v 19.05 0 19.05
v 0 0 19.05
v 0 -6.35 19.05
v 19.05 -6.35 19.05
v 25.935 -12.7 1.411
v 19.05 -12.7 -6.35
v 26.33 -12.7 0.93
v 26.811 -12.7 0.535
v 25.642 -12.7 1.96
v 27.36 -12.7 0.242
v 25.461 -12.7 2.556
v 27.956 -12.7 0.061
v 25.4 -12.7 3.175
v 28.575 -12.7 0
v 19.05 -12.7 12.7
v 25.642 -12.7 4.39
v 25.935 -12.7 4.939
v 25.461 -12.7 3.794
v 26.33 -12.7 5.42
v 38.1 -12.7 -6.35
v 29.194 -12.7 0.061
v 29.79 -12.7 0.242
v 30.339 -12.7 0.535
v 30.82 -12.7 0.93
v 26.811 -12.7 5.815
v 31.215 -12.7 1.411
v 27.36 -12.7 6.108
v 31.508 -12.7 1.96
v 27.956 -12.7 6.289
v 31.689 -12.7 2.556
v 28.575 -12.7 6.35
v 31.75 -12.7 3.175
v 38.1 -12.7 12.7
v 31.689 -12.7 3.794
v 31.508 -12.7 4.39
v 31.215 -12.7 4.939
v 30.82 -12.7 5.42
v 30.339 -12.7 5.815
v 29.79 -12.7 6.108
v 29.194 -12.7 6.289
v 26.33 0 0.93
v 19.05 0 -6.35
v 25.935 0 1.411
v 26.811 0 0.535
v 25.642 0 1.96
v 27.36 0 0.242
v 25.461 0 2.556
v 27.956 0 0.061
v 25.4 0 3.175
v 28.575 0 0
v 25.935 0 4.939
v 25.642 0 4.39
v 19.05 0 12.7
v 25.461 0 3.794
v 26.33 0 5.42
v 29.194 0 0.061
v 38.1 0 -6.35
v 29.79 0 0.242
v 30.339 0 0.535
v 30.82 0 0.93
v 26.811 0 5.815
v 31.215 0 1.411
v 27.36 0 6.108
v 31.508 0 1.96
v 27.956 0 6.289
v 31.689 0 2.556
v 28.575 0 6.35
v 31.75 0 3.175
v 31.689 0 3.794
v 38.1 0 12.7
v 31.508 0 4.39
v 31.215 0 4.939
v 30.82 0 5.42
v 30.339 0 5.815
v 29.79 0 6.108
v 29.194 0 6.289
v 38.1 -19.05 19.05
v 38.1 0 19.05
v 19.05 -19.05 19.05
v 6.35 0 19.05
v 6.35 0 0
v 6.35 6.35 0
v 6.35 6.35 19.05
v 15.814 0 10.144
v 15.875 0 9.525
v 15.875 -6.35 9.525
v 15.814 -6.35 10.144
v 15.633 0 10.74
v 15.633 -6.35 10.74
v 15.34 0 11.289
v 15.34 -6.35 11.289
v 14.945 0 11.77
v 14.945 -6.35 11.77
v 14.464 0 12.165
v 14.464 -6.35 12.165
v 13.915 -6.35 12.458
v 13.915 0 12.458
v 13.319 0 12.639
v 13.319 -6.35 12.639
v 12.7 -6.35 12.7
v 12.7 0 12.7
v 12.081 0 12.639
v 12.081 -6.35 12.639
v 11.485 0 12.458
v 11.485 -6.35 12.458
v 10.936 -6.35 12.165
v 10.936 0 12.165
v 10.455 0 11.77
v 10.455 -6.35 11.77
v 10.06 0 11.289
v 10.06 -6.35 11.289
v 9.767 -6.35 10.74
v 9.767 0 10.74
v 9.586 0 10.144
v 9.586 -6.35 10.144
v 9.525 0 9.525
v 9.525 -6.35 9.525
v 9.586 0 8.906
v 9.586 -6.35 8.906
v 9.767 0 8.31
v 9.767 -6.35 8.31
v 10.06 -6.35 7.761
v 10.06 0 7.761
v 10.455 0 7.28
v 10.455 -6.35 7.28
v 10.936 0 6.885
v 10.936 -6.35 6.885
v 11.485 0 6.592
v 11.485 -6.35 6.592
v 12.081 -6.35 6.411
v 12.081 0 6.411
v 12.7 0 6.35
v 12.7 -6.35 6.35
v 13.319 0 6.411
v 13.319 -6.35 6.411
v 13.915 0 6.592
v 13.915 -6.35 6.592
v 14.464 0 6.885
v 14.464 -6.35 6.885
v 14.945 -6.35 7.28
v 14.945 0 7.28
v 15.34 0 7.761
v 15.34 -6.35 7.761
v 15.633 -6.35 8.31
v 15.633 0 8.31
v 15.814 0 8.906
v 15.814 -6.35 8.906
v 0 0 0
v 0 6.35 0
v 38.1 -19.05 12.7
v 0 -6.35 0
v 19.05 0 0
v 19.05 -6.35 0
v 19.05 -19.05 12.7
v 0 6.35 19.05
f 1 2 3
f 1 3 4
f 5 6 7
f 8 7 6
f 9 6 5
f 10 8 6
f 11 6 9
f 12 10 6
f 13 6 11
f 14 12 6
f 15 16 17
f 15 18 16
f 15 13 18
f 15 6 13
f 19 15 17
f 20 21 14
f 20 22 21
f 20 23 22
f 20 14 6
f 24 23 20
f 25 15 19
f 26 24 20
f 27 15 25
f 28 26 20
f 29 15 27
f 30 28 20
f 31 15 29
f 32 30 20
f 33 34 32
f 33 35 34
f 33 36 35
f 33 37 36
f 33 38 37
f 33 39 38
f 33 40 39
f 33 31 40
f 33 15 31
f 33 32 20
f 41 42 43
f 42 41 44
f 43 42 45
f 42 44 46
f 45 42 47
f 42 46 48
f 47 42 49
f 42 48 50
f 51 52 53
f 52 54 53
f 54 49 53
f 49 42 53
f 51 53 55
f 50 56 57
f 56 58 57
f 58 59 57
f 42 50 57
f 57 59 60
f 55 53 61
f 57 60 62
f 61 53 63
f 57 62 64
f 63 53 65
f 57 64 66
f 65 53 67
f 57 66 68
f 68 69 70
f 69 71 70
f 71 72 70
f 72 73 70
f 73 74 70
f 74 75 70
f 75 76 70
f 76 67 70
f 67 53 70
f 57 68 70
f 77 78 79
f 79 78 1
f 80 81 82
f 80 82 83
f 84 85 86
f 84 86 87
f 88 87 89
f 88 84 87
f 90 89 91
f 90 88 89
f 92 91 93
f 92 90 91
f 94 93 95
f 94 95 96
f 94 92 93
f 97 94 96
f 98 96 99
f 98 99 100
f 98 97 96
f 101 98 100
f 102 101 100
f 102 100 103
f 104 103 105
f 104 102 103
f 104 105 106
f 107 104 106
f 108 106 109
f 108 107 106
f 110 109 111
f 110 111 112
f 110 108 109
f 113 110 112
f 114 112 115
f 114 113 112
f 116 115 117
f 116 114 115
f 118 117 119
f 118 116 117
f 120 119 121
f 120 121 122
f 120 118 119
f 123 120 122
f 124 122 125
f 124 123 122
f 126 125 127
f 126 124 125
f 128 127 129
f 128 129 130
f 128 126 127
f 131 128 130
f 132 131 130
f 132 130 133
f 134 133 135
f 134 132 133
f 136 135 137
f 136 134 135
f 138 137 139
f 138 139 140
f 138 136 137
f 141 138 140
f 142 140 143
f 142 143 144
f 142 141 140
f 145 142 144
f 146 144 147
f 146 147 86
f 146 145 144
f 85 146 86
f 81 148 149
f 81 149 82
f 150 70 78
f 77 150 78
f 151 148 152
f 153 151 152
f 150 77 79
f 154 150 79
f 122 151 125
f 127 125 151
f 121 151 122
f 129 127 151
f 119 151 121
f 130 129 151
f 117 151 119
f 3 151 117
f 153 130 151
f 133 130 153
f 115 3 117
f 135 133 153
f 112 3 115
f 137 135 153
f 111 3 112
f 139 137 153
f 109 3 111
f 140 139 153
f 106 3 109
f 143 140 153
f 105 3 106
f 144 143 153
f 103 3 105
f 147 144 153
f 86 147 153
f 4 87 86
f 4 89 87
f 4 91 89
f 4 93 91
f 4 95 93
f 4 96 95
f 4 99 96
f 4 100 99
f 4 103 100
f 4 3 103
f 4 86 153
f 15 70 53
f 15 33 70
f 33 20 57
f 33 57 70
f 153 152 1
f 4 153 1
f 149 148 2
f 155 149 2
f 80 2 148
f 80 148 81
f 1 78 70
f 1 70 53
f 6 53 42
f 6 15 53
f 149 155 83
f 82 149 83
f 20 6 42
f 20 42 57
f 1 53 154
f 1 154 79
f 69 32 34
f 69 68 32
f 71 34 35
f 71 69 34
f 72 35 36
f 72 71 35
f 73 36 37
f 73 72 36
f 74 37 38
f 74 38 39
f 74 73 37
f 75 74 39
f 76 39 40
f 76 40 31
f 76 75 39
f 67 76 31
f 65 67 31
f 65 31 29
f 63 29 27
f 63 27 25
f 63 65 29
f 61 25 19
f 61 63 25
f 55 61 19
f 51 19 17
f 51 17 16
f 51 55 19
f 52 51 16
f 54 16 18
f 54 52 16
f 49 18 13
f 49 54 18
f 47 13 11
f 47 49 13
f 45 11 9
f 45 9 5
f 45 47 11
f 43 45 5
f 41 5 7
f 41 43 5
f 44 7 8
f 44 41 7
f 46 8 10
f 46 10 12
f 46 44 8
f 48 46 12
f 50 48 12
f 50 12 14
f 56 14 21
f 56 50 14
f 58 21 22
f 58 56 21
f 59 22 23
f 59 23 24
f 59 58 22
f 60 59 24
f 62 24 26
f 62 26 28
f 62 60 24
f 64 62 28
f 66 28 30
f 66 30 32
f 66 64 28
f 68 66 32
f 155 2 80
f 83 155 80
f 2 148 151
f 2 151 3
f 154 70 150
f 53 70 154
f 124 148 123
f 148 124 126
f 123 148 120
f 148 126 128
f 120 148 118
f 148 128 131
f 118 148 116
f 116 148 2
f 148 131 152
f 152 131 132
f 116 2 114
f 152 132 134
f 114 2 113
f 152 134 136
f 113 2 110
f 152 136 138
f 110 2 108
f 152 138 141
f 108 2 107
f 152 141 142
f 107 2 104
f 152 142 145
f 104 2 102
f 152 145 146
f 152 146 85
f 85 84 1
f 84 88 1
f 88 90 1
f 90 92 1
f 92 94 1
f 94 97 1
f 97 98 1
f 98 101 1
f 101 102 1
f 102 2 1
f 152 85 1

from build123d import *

# Parameters (mm, degrees)
F0_W     = 19.05
F0_H     = 19.05
F0_R     = 3.175
F1_DEPTH = 6.35
F2_W     = 6.35
F2_H     = 19.05
F3_DEPTH = 6.35
F4_R     = 3.175
F5_DEPTH = 6.35
F6_W     = 19.05
F6_H     = 6.35
F7_DEPTH = 19.05


with BuildPart() as f1:
    # F0 (on Front) → F1 (new body)
    with BuildSketch(Plane.XZ):
        with Locations((9.525, 9.525)):
            Rectangle(F0_W, F0_H)
        with Locations((12.7, 9.525)):
            Circle(F0_R, mode=Mode.SUBTRACT)
    extrude(amount=F1_DEPTH)


with BuildPart() as f3:
    # F2 (on face) → F3 (new body)
    with BuildSketch(Plane.XZ):
        with Locations((3.175, 9.525)):
            Rectangle(F2_W, F2_H)
    extrude(amount=-F3_DEPTH)


with BuildPart() as f5:
    # F4 (on face) → F5 (new body, symmetric)
    with BuildSketch(Plane.XZ.offset(6.35)):
        Polygon((19.05, 12.7), (19.05, 0), (19.05, -6.35), (38.1, -6.35), (38.1, 12.7), align=None)
        with Locations((28.575, 3.175)):
            Circle(F4_R, mode=Mode.SUBTRACT)
    extrude(amount=F5_DEPTH, both=True)


with BuildPart() as f7:
    # F6 (on face) → F7 (new body)
    with BuildSketch(Plane(origin=(0, 0, 0), x_dir=(-1, 0, 0), z_dir=(0, 1, 0))):
        with Locations((-28.575, 15.875)):
            Rectangle(F6_W, F6_H)
    extrude(amount=-F7_DEPTH)


solid = Compound([f1.part, f3.part, f5.part, f7.part])
